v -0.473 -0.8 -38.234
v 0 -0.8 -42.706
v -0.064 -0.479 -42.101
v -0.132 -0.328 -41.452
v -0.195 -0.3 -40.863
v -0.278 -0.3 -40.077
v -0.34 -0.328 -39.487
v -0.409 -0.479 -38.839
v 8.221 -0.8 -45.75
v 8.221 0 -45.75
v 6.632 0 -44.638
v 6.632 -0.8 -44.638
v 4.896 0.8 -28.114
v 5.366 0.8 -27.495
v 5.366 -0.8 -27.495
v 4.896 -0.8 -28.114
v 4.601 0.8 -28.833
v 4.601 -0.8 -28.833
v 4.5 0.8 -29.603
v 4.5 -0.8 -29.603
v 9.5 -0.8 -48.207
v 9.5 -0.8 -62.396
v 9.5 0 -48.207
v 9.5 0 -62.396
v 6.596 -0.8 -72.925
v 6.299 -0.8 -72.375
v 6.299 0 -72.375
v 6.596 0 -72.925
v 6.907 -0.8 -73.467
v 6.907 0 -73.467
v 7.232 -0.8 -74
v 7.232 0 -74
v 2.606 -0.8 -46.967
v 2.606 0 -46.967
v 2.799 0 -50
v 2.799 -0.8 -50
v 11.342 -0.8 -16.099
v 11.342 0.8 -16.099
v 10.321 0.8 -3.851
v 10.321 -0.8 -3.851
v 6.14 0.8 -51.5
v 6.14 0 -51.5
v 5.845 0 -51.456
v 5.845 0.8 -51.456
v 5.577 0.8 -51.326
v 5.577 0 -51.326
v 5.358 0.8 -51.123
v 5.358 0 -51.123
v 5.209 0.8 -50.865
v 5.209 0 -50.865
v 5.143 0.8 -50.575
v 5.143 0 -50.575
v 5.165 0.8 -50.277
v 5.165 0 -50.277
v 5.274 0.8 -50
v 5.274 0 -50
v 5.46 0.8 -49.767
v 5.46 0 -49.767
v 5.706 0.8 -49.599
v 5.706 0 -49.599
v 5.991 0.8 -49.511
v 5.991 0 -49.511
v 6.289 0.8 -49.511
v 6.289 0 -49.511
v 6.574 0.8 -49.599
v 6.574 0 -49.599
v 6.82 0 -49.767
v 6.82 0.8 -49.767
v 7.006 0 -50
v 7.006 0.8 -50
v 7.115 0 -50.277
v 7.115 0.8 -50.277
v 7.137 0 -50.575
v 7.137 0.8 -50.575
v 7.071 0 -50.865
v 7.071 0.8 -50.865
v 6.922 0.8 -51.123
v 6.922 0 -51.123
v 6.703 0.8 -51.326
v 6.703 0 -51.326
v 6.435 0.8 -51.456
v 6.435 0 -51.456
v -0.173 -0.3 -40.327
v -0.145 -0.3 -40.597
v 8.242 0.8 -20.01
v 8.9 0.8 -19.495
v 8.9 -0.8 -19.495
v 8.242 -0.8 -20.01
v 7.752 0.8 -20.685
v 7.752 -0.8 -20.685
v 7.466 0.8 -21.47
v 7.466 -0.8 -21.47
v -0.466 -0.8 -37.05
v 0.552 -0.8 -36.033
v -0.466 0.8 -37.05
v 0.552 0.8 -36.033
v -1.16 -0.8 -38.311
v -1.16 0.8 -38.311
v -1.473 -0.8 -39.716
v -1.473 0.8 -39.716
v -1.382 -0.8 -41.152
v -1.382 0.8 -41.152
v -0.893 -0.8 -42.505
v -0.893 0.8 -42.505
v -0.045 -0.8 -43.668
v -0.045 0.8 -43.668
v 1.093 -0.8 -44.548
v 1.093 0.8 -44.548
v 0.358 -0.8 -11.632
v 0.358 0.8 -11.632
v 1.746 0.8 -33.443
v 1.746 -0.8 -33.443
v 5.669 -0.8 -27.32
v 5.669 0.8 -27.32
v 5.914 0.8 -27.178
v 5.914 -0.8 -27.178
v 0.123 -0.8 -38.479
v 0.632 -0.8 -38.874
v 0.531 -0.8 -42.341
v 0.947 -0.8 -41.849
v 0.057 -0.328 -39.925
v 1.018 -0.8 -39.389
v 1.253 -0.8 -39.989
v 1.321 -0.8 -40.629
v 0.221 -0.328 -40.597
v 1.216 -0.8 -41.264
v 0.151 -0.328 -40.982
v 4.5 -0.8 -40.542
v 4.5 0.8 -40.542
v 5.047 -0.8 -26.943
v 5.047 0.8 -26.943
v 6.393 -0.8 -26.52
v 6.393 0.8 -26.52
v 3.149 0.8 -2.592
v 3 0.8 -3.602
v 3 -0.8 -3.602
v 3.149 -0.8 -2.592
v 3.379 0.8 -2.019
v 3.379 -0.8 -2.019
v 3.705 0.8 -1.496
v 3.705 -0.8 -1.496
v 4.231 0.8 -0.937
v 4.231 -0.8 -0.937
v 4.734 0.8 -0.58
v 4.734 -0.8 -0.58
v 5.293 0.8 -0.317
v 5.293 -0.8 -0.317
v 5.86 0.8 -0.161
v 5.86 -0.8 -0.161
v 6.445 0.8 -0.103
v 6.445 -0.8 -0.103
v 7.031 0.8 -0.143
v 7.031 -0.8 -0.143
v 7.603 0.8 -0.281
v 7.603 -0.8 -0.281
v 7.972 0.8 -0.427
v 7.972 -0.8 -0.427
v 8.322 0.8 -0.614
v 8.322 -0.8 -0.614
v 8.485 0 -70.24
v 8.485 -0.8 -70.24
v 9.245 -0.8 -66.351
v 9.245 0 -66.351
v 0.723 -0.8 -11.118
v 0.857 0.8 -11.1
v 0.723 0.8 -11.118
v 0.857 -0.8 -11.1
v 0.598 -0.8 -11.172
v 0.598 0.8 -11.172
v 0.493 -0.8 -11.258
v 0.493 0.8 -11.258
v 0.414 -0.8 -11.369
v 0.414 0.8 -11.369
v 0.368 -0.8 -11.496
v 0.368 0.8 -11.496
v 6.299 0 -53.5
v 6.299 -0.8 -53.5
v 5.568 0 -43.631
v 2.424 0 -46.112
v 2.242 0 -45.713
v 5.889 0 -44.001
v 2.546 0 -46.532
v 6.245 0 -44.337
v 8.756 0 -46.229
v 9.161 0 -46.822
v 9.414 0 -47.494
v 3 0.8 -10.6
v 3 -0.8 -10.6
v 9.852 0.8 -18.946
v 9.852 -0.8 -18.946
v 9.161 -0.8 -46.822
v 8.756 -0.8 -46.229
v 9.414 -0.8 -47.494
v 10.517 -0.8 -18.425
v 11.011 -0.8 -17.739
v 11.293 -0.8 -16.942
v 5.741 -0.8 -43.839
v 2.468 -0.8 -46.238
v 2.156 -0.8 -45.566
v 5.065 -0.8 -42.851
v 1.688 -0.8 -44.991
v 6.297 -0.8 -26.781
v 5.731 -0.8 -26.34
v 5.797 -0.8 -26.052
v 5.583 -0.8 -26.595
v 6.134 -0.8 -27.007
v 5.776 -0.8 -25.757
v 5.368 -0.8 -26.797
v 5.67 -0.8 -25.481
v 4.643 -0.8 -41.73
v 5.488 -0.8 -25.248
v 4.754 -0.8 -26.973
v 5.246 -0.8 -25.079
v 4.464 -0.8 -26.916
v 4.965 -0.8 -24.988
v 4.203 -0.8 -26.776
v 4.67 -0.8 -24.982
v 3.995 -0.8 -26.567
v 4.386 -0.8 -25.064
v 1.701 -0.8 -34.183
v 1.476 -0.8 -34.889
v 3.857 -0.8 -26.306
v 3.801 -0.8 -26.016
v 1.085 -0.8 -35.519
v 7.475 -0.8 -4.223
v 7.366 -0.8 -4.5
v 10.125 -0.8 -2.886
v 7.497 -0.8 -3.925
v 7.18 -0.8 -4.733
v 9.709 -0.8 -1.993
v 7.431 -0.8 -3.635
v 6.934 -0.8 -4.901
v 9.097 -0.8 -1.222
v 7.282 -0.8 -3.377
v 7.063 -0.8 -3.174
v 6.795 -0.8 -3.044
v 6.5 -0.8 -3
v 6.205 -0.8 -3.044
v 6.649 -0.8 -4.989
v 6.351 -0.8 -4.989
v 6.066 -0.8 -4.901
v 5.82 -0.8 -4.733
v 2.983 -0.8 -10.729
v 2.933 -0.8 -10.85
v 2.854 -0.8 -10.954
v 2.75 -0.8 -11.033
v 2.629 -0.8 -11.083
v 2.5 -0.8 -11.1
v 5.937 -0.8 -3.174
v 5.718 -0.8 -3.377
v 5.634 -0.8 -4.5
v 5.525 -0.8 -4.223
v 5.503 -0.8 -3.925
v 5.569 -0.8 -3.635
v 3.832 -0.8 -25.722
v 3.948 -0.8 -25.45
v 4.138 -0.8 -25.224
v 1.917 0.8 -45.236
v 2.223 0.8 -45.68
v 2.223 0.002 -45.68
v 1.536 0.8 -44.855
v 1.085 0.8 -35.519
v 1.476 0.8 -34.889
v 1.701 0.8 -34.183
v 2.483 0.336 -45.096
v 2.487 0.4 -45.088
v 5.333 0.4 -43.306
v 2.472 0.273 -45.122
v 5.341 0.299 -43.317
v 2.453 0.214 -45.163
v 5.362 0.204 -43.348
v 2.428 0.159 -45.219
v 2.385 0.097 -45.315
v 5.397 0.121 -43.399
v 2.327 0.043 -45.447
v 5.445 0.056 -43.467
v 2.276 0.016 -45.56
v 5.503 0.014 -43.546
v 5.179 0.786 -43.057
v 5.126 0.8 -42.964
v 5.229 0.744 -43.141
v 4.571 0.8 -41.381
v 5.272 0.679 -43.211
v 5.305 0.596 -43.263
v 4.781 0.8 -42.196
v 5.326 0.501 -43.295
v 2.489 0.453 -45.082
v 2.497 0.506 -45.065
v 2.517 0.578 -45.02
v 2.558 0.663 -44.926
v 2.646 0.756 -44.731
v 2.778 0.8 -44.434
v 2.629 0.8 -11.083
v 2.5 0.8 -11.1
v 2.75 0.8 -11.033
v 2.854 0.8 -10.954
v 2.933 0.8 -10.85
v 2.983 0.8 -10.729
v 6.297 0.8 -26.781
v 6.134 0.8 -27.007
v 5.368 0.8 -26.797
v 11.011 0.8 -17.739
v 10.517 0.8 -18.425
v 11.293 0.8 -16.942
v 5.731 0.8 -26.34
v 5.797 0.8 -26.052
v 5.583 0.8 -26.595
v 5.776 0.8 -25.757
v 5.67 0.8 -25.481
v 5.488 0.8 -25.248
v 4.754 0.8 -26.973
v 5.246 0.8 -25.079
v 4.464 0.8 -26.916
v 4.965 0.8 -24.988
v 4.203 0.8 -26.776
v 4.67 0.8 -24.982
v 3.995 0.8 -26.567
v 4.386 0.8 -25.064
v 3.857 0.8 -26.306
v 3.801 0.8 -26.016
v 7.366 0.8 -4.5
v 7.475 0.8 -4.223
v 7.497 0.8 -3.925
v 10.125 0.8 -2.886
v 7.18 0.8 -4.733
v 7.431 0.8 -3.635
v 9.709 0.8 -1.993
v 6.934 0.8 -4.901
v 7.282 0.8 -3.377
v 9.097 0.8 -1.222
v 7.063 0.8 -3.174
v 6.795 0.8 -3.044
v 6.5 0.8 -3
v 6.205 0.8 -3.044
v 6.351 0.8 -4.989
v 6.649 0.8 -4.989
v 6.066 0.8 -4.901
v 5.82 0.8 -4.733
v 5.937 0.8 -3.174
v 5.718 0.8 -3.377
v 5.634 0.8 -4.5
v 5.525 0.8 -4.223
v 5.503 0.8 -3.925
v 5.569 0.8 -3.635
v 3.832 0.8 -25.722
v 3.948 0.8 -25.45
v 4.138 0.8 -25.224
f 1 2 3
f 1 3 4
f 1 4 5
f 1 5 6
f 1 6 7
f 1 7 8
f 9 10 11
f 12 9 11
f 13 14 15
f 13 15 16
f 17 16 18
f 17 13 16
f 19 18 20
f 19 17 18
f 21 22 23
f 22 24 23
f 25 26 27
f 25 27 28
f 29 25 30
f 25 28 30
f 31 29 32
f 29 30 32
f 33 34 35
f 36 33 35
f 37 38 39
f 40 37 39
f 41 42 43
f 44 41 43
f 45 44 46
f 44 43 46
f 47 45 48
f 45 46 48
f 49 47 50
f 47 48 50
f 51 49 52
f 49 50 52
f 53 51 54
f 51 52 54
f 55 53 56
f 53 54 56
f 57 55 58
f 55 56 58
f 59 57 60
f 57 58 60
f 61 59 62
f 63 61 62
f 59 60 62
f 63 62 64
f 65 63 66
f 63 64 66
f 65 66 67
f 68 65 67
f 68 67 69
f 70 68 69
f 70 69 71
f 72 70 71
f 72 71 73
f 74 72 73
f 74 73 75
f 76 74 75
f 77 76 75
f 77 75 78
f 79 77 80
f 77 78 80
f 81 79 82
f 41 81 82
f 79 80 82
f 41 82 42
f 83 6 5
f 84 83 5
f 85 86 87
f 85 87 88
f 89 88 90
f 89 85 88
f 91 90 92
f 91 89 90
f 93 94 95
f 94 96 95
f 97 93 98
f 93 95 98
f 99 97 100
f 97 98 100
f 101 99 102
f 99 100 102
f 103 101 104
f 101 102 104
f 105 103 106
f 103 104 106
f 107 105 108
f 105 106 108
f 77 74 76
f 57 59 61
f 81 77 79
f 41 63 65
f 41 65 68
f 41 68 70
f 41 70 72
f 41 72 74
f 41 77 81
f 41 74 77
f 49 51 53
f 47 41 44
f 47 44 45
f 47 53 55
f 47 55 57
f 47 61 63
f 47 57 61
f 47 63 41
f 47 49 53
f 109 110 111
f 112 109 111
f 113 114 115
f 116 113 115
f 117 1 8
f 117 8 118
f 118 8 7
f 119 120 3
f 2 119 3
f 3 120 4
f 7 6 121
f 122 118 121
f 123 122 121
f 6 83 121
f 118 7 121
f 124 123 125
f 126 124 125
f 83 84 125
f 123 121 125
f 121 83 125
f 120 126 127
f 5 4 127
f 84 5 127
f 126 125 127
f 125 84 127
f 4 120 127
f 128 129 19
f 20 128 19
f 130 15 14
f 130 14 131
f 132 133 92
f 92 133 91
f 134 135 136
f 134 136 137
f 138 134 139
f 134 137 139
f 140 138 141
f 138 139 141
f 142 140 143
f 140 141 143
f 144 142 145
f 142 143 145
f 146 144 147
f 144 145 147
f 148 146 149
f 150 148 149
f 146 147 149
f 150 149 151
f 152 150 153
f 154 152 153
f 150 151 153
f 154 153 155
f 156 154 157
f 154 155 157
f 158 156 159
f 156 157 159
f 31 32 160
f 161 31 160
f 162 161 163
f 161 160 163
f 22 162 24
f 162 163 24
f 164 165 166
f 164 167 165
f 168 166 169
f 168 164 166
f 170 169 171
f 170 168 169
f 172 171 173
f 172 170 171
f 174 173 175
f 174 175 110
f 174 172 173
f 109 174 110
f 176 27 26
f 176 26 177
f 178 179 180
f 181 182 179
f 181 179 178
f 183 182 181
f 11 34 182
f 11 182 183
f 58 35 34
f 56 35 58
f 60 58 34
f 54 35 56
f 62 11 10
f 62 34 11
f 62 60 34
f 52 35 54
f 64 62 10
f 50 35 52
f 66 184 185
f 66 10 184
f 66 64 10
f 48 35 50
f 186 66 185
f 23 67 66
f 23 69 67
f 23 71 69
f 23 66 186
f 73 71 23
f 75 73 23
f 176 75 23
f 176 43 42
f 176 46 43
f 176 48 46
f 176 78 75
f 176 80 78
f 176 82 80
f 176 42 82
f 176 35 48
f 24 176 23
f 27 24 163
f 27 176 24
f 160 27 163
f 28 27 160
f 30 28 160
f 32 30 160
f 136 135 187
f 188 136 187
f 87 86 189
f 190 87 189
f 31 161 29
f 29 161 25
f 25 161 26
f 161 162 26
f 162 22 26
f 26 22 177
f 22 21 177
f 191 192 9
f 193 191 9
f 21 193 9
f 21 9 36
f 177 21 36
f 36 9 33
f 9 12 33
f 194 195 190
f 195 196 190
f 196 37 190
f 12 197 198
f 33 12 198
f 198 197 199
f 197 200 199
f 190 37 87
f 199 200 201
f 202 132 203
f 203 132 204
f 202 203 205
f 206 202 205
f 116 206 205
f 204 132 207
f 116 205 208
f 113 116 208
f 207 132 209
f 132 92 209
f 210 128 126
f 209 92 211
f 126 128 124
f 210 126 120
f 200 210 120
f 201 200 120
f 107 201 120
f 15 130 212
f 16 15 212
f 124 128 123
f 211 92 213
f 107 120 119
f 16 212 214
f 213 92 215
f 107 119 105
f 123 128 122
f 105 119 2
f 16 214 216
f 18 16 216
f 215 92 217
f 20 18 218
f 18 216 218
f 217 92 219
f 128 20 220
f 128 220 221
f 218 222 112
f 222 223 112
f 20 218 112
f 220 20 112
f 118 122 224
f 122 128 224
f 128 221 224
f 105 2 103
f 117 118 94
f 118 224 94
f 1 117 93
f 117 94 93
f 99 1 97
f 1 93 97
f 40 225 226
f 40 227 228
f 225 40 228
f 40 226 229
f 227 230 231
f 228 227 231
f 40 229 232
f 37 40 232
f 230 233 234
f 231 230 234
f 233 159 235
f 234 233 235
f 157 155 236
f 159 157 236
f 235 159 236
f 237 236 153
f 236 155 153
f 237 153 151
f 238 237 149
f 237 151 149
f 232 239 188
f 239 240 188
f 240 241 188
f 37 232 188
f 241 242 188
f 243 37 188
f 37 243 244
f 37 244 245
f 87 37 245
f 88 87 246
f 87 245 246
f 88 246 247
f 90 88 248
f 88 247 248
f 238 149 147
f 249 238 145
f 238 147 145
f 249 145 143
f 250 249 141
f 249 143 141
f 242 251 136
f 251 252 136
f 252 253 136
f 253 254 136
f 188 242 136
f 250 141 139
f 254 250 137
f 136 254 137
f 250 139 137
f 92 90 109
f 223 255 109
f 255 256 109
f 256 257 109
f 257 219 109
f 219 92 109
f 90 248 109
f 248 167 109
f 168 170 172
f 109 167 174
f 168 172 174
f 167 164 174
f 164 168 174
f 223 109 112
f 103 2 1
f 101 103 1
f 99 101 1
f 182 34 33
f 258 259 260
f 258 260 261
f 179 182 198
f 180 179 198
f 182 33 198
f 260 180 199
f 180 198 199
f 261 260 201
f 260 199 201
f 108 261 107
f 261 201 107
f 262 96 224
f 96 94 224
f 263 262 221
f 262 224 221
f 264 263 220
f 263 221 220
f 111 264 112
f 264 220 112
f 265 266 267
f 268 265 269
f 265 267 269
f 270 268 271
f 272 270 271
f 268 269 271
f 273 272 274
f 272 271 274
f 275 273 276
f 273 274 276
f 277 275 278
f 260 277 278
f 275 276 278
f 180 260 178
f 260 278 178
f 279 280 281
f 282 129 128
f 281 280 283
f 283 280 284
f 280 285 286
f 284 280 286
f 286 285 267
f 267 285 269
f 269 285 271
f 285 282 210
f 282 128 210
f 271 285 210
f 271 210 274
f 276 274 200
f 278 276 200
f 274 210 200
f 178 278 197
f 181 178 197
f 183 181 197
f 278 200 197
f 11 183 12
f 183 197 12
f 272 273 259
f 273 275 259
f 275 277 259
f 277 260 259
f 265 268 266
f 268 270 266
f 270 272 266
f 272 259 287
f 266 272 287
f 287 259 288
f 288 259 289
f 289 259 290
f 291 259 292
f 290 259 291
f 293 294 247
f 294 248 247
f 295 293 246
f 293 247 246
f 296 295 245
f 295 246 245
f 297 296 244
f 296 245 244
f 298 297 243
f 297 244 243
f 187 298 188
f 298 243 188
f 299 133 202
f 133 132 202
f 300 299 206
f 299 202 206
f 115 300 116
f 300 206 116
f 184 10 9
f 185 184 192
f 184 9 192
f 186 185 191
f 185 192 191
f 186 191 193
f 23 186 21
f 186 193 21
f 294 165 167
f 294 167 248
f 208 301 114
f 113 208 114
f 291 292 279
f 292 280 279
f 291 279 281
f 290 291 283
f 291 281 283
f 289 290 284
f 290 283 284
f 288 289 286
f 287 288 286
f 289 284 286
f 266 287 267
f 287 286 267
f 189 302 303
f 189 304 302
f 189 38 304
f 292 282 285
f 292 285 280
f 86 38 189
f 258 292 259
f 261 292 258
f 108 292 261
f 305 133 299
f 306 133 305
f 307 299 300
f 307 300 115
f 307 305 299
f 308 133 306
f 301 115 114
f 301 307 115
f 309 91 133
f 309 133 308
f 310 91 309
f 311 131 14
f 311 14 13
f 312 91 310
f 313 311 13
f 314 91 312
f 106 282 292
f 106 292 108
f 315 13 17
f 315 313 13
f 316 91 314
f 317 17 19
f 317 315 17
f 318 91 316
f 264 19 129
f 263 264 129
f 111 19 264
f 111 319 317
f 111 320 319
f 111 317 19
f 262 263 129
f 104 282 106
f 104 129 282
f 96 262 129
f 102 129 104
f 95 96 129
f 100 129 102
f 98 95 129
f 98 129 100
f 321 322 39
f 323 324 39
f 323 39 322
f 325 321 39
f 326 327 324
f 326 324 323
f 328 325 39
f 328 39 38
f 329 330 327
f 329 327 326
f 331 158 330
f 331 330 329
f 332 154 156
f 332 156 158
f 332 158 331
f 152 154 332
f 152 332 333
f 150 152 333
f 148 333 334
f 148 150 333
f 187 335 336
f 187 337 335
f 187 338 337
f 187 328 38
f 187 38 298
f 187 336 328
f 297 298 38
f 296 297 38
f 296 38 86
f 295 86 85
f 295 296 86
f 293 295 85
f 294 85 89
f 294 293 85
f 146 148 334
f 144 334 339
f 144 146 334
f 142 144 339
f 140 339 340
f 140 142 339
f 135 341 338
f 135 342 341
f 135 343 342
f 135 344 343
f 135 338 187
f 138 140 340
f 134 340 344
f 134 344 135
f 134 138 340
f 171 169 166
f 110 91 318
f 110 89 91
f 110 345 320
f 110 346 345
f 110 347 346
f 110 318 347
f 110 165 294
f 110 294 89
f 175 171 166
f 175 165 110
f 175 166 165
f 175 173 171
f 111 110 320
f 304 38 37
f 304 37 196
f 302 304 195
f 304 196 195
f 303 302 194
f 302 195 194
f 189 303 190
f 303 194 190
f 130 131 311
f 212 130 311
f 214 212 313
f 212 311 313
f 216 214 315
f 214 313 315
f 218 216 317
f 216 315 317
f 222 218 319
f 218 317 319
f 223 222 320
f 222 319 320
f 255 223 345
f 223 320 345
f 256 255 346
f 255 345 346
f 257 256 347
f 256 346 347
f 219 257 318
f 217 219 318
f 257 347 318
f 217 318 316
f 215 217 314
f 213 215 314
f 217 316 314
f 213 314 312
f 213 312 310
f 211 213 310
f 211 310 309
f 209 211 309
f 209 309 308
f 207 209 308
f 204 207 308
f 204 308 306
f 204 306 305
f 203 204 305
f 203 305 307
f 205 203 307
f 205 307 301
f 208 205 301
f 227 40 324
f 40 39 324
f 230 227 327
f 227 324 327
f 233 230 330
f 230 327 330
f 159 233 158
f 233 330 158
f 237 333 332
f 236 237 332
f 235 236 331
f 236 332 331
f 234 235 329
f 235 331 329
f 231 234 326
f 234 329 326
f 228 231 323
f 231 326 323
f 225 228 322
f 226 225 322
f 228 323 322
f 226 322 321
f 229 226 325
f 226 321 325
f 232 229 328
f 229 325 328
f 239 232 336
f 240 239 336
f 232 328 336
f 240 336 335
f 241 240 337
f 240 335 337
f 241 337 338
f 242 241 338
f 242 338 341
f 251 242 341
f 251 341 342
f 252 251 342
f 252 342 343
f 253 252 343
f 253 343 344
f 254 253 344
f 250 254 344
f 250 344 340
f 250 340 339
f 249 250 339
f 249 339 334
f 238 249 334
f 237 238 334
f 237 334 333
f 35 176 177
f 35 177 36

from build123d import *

# Parameters (mm, degrees)
BOSS_EXTRUDE1_DEPTH     = 0.8
FILLET1_R               = 4.2
SKETCH2_R               = 1
CUT_EXTRUDE1_DEPTH      = 75.905340264
CUT_EXTRUDE2_DEPTH      = 75.905340264
CUT_EXTRUDE_THIN1_DEPTH = 75.905340264
FILLET2_R               = 3
CUT_EXTRUDE4_DEPTH      = 0.8
FILLET3_R               = 5
FILLET4_R               = 0.4
FILLET5_R               = 3
FILLET6_R               = 1
SKETCH6_R               = 1
BOSS_EXTRUDE2_DEPTH     = 0.8
SKETCH7_W               = 3
SKETCH7_H               = 11.1
CUT_EXTRUDE5_DEPTH      = 75.882809828
FILLET7_R               = 0.5
FILLET8_R               = 0.5
FILLET10_R              = 3.5
CUT_EXTRUDE6_DEPTH      = 0.5
FILLET11_R              = 2.4


# Some blends are built 0.0001 mm under size
with BuildPart() as part:
    # Sketch1 → Boss-Extrude1 (new, symmetric)
    with BuildSketch(Plane(origin=(0, 0, 0), x_dir=(1, 0, 0), z_dir=(0, 1, 0))):
        with BuildLine():
            Line((0, 0), (0, 6))
            Line((0, 6), (1.865312064, 35.32161706))
            ThreePointArc((1.865312064, 35.32161706), (-1.478238126, 40.437157563), (2.486591749, 45.087771133))
            Line((2.486591749, 45.087771133), (3.611473385, 62.770253978))
            ThreePointArc((3.611473385, 62.770253978), (4.720909281, 68.611088902), (7.232052008, 74))
            ThreePointArc((7.232052008, 74), (8.927699757, 68.307599169), (9.5, 62.395651864))
            Line((9.5, 62.395651864), (9.5, 46.645651864))
            Line((9.5, 46.645651864), (4.5, 43.144614173))
            Line((4.5, 43.144614173), (4.5, 27.994614173))
            Line((4.5, 27.994614173), (6.3, 26.955383689))
            Line((6.3, 26.955383689), (7.743698597, 20.163315799))
            Line((7.743698597, 20.163315799), (11.5, 17.994614173))
            Line((11.5, 17.994614173), (10, 0))
            Line((10, 0), (0, 0))
        make_face()
    extrude(amount=BOSS_EXTRUDE1_DEPTH, both=True)

    # Fillet1
    fillet1_edges = [part.edges().sort_by_distance(p)[0] for p in [
        (10, 0, 0),
    ]]
    fillet(fillet1_edges, radius=FILLET1_R)

    # Sketch2 → Cut-Extrude1 (cut, through all)
    with BuildSketch(Plane(origin=(0, 0.8, 0), x_dir=(1, 0, 0), z_dir=(0, 1, 0))):
        with Locations(Location((6.5, 4, 0), (0, 0, 270))):
            Circle(SKETCH2_R)
    extrude(amount=-CUT_EXTRUDE1_DEPTH, mode=Mode.SUBTRACT)

    # Sketch3 → Cut-Extrude2 (cut, through all)
    with BuildSketch(Plane(origin=(0, 0.8, 0), x_dir=(1, 0, 0), z_dir=(0, 1, 0))):
        with BuildLine():
            Line((5.640057539, 27.969251754), (5.047431638, 26.942793585))
            ThreePointArc((5.047431638, 26.942793585), (4.386066515, 25.063581102), (5.367538565, 26.797235046))
            Line((5.367538565, 26.797235046), (5.94316643, 27.794251754))
            Line((5.94316643, 27.794251754), (5.640057539, 27.969251754))
        make_face()
    extrude(amount=-CUT_EXTRUDE2_DEPTH, mode=Mode.SUBTRACT)

    # Sketch4 → Cut-Extrude-Thin1 (cut, through all)
    with BuildSketch(Plane(origin=(0, 0.8, 0), x_dir=(1, 0, 0), z_dir=(0, 1, 0))):
        Polygon((6.299086102, 72.375061168), (6.299086102, 53.5), (2.799086102, 50), (-4.271981709, 57.071067812), (-3.700913898, 57.642135624), (-3.700913898, 72.375061168), align=None)
    extrude(amount=-CUT_EXTRUDE_THIN1_DEPTH, mode=Mode.SUBTRACT)

    # Fillet2
    fillet2_edges = [part.edges().sort_by_distance(p)[0] for p in [
        (1.865312064, 0, -35.32161706),
        (2.486591749, 0, -45.087771133),
        (9.5, 0, -46.645651864),
    ]]
    fillet(fillet2_edges, radius=FILLET2_R)

    # Sketch5 → Cut-Extrude4 (cut)
    with BuildSketch(Plane(origin=(0, 0.8, 0), x_dir=(1, 0, 0), z_dir=(0, 1, 0))):
        Polygon((2.486591749, 45.087771133), (13.455116217, 38.22222401), (13.455116217, 80.886155846), (2.486591749, 80.886155846), (1.62289593, 47.027246142), align=None)
    extrude(amount=-CUT_EXTRUDE4_DEPTH, mode=Mode.SUBTRACT)

    # Fillet3
    fillet3_edges = [part.edges().sort_by_distance(p)[0] for p in [
        (4.5, 0, -43.144614173),
    ]]
    fillet(fillet3_edges, radius=FILLET3_R)

    # Fillet4
    fillet4_edges = [part.edges().sort_by_distance(p)[0] for p in [
        (3.91002639, 0, -44.196798274),
        (3.91002639, 0.8, -44.196798274),
    ]]
    fillet(fillet4_edges, radius=FILLET4_R - 0.0001)  # a hair under: the kernel refuses the full size

    # Fillet5
    # the kernel refuses this fillet: 3 mm, written as the material it adds along each edge
    with BuildSketch(Plane(origin=(4.5, 0.8, -27.994614173), x_dir=(0.8660254037844444, 0, 0.49999999999999023), z_dir=(0, -1, 0))) as fillet5_piece_1:
        with BuildLine():
            CenterArc((1.793781136, -2.893079935), FILLET5_R, 105.342812505, 44.657187495)
            Line((-0.804295075, -1.393079935), (0, 0))
            Line((0, 0), (1, 0))
        make_face()
    extrude(amount=1.6)
    with BuildSketch(Plane(origin=(7.743698597, 0.8, -20.163315799), x_dir=(0.8660254037844403, 0, 0.49999999999999734), z_dir=(0, -1, 0))) as fillet5_piece_2:
        with BuildLine():
            CenterArc((FILLET5_R * 0.445228685309, -FILLET5_R), FILLET5_R, 90, 48)
            Line((-FILLET5_R * 0.297916140169, -FILLET5_R * 0.330869393641), (0, 0))
            Line((0, 0), (FILLET5_R * 0.445228685309, 0))
        make_face()
    extrude(amount=1.6)
    # the kernel refuses this fillet: 3 mm, written as the material it takes off along each edge
    with BuildSketch(Plane(origin=(11.5, -5.55643762, -17.994614173), x_dir=(-0.86602540378444, 0, -0.49999999999999756), z_dir=(0, 1, 0))) as fillet5_2_piece_1:
        with BuildLine():
            CenterArc((FILLET5_R * 0.634191682642, FILLET5_R), FILLET5_R, 205.234939105, 64.765060895)
            Line((-FILLET5_R * 0.270375560362, FILLET5_R * 0.573669021903), (0, 0))
            Line((0, 0), (FILLET5_R * 0.634191682642, 0))
        make_face()
    extrude(amount=11.11287524, mode=Mode.SUBTRACT)

    # Fillet6
    fillet6_edges = [part.edges().sort_by_distance(p)[0] for p in [
        (6.3, 0, -26.955383689),
    ]]
    fillet(fillet6_edges, radius=FILLET6_R)

    # Sketch6 → Boss-Extrude2 (add)
    with BuildSketch(Plane(origin=(0, 0, 0), x_dir=(1, 0, 0), z_dir=(0, 1, 0))):
        with Locations(Location((6.14, 50.5, 0), (0, 0, 90))):
            Circle(SKETCH6_R)
    extrude(amount=BOSS_EXTRUDE2_DEPTH)

    # Sketch7 → Cut-Extrude5 (cut, through all)
    with BuildSketch(Plane(origin=(0, 0.8, 0), x_dir=(1, 0, 0), z_dir=(0, 1, 0))):
        with Locations((1.5, 5.55)):
            Rectangle(SKETCH7_W, SKETCH7_H)
    extrude(amount=-CUT_EXTRUDE5_DEPTH, mode=Mode.SUBTRACT)

    # Fillet7
    fillet7_edges = [part.edges().sort_by_distance(p)[0] for p in [
        (0.324439526, 0, -11.1),
    ]]
    fillet(fillet7_edges, radius=FILLET7_R)

    # Fillet8
    fillet8_edges = [part.edges().sort_by_distance(p)[0] for p in [
        (3, 0, -11.1),
    ]]
    fillet(fillet8_edges, radius=FILLET8_R)

    # Fillet10
    fillet10_edges = [part.edges().sort_by_distance(p)[0] for p in [
        (3, 0, 0),
    ]]
    fillet(fillet10_edges, radius=FILLET10_R)

    # Sketch8 → Cut-Extrude6 (cut)
    with BuildSketch(Plane.XZ.offset(0.8)):
        with BuildLine():
            Line((0, -42.705581243), (-0.472751816, -38.234175203))
            ThreePointArc((-0.472751816, -38.234175203), (1.308763911, -40.306514027), (0, -42.705581243))
        make_face()
    extrude(amount=-CUT_EXTRUDE6_DEPTH, mode=Mode.SUBTRACT)

    # Fillet11
    # the kernel refuses this fillet: 2.4 mm, written as the material it adds along each edge
    with BuildSketch(Plane(origin=(-1.081254443, -0.3, -40.559205352), x_dir=(-0.9553191525831795, 0, 0.2955762451682408), z_dir=(-0.2955762451682408, 0, -0.9553191525831795))) as fillet11_piece_1_section:
        with BuildLine():
            CenterArc((0.937051647, -2.4), FILLET11_R, 52.341537994, 37.658462006)
            Line((0.937051647, 0), (0.937051647, 0.048))
            Line((0.937051647, 0.048), (2.403339477, 0.048))
            Line((2.403339477, 0.048), (2.451339477, 0))
            ThreePointArc((2.451339477, 0), (2.451339477, -0.25), (2.432665233, -0.462))
            Line((2.432665233, -0.462), (2.403339477, -0.5))
        make_face()
    fillet11_piece_1 = revolve(axis=Axis((-1.081254443, -0.3, -40.559205352), (0, 1, 0)), revolution_arc=313.54514328, mode=Mode.PRIVATE)
    fillet11_piece_1 = split(fillet11_piece_1, bisect_by=Plane(origin=(-0.236375908, -0.3, -40.469878223), z_dir=(0.9944572448546122, 0, 0.1051417526778682)), keep=Keep.TOP, mode=Mode.PRIVATE)
    add(fillet11_piece_1)


solid = part.part
